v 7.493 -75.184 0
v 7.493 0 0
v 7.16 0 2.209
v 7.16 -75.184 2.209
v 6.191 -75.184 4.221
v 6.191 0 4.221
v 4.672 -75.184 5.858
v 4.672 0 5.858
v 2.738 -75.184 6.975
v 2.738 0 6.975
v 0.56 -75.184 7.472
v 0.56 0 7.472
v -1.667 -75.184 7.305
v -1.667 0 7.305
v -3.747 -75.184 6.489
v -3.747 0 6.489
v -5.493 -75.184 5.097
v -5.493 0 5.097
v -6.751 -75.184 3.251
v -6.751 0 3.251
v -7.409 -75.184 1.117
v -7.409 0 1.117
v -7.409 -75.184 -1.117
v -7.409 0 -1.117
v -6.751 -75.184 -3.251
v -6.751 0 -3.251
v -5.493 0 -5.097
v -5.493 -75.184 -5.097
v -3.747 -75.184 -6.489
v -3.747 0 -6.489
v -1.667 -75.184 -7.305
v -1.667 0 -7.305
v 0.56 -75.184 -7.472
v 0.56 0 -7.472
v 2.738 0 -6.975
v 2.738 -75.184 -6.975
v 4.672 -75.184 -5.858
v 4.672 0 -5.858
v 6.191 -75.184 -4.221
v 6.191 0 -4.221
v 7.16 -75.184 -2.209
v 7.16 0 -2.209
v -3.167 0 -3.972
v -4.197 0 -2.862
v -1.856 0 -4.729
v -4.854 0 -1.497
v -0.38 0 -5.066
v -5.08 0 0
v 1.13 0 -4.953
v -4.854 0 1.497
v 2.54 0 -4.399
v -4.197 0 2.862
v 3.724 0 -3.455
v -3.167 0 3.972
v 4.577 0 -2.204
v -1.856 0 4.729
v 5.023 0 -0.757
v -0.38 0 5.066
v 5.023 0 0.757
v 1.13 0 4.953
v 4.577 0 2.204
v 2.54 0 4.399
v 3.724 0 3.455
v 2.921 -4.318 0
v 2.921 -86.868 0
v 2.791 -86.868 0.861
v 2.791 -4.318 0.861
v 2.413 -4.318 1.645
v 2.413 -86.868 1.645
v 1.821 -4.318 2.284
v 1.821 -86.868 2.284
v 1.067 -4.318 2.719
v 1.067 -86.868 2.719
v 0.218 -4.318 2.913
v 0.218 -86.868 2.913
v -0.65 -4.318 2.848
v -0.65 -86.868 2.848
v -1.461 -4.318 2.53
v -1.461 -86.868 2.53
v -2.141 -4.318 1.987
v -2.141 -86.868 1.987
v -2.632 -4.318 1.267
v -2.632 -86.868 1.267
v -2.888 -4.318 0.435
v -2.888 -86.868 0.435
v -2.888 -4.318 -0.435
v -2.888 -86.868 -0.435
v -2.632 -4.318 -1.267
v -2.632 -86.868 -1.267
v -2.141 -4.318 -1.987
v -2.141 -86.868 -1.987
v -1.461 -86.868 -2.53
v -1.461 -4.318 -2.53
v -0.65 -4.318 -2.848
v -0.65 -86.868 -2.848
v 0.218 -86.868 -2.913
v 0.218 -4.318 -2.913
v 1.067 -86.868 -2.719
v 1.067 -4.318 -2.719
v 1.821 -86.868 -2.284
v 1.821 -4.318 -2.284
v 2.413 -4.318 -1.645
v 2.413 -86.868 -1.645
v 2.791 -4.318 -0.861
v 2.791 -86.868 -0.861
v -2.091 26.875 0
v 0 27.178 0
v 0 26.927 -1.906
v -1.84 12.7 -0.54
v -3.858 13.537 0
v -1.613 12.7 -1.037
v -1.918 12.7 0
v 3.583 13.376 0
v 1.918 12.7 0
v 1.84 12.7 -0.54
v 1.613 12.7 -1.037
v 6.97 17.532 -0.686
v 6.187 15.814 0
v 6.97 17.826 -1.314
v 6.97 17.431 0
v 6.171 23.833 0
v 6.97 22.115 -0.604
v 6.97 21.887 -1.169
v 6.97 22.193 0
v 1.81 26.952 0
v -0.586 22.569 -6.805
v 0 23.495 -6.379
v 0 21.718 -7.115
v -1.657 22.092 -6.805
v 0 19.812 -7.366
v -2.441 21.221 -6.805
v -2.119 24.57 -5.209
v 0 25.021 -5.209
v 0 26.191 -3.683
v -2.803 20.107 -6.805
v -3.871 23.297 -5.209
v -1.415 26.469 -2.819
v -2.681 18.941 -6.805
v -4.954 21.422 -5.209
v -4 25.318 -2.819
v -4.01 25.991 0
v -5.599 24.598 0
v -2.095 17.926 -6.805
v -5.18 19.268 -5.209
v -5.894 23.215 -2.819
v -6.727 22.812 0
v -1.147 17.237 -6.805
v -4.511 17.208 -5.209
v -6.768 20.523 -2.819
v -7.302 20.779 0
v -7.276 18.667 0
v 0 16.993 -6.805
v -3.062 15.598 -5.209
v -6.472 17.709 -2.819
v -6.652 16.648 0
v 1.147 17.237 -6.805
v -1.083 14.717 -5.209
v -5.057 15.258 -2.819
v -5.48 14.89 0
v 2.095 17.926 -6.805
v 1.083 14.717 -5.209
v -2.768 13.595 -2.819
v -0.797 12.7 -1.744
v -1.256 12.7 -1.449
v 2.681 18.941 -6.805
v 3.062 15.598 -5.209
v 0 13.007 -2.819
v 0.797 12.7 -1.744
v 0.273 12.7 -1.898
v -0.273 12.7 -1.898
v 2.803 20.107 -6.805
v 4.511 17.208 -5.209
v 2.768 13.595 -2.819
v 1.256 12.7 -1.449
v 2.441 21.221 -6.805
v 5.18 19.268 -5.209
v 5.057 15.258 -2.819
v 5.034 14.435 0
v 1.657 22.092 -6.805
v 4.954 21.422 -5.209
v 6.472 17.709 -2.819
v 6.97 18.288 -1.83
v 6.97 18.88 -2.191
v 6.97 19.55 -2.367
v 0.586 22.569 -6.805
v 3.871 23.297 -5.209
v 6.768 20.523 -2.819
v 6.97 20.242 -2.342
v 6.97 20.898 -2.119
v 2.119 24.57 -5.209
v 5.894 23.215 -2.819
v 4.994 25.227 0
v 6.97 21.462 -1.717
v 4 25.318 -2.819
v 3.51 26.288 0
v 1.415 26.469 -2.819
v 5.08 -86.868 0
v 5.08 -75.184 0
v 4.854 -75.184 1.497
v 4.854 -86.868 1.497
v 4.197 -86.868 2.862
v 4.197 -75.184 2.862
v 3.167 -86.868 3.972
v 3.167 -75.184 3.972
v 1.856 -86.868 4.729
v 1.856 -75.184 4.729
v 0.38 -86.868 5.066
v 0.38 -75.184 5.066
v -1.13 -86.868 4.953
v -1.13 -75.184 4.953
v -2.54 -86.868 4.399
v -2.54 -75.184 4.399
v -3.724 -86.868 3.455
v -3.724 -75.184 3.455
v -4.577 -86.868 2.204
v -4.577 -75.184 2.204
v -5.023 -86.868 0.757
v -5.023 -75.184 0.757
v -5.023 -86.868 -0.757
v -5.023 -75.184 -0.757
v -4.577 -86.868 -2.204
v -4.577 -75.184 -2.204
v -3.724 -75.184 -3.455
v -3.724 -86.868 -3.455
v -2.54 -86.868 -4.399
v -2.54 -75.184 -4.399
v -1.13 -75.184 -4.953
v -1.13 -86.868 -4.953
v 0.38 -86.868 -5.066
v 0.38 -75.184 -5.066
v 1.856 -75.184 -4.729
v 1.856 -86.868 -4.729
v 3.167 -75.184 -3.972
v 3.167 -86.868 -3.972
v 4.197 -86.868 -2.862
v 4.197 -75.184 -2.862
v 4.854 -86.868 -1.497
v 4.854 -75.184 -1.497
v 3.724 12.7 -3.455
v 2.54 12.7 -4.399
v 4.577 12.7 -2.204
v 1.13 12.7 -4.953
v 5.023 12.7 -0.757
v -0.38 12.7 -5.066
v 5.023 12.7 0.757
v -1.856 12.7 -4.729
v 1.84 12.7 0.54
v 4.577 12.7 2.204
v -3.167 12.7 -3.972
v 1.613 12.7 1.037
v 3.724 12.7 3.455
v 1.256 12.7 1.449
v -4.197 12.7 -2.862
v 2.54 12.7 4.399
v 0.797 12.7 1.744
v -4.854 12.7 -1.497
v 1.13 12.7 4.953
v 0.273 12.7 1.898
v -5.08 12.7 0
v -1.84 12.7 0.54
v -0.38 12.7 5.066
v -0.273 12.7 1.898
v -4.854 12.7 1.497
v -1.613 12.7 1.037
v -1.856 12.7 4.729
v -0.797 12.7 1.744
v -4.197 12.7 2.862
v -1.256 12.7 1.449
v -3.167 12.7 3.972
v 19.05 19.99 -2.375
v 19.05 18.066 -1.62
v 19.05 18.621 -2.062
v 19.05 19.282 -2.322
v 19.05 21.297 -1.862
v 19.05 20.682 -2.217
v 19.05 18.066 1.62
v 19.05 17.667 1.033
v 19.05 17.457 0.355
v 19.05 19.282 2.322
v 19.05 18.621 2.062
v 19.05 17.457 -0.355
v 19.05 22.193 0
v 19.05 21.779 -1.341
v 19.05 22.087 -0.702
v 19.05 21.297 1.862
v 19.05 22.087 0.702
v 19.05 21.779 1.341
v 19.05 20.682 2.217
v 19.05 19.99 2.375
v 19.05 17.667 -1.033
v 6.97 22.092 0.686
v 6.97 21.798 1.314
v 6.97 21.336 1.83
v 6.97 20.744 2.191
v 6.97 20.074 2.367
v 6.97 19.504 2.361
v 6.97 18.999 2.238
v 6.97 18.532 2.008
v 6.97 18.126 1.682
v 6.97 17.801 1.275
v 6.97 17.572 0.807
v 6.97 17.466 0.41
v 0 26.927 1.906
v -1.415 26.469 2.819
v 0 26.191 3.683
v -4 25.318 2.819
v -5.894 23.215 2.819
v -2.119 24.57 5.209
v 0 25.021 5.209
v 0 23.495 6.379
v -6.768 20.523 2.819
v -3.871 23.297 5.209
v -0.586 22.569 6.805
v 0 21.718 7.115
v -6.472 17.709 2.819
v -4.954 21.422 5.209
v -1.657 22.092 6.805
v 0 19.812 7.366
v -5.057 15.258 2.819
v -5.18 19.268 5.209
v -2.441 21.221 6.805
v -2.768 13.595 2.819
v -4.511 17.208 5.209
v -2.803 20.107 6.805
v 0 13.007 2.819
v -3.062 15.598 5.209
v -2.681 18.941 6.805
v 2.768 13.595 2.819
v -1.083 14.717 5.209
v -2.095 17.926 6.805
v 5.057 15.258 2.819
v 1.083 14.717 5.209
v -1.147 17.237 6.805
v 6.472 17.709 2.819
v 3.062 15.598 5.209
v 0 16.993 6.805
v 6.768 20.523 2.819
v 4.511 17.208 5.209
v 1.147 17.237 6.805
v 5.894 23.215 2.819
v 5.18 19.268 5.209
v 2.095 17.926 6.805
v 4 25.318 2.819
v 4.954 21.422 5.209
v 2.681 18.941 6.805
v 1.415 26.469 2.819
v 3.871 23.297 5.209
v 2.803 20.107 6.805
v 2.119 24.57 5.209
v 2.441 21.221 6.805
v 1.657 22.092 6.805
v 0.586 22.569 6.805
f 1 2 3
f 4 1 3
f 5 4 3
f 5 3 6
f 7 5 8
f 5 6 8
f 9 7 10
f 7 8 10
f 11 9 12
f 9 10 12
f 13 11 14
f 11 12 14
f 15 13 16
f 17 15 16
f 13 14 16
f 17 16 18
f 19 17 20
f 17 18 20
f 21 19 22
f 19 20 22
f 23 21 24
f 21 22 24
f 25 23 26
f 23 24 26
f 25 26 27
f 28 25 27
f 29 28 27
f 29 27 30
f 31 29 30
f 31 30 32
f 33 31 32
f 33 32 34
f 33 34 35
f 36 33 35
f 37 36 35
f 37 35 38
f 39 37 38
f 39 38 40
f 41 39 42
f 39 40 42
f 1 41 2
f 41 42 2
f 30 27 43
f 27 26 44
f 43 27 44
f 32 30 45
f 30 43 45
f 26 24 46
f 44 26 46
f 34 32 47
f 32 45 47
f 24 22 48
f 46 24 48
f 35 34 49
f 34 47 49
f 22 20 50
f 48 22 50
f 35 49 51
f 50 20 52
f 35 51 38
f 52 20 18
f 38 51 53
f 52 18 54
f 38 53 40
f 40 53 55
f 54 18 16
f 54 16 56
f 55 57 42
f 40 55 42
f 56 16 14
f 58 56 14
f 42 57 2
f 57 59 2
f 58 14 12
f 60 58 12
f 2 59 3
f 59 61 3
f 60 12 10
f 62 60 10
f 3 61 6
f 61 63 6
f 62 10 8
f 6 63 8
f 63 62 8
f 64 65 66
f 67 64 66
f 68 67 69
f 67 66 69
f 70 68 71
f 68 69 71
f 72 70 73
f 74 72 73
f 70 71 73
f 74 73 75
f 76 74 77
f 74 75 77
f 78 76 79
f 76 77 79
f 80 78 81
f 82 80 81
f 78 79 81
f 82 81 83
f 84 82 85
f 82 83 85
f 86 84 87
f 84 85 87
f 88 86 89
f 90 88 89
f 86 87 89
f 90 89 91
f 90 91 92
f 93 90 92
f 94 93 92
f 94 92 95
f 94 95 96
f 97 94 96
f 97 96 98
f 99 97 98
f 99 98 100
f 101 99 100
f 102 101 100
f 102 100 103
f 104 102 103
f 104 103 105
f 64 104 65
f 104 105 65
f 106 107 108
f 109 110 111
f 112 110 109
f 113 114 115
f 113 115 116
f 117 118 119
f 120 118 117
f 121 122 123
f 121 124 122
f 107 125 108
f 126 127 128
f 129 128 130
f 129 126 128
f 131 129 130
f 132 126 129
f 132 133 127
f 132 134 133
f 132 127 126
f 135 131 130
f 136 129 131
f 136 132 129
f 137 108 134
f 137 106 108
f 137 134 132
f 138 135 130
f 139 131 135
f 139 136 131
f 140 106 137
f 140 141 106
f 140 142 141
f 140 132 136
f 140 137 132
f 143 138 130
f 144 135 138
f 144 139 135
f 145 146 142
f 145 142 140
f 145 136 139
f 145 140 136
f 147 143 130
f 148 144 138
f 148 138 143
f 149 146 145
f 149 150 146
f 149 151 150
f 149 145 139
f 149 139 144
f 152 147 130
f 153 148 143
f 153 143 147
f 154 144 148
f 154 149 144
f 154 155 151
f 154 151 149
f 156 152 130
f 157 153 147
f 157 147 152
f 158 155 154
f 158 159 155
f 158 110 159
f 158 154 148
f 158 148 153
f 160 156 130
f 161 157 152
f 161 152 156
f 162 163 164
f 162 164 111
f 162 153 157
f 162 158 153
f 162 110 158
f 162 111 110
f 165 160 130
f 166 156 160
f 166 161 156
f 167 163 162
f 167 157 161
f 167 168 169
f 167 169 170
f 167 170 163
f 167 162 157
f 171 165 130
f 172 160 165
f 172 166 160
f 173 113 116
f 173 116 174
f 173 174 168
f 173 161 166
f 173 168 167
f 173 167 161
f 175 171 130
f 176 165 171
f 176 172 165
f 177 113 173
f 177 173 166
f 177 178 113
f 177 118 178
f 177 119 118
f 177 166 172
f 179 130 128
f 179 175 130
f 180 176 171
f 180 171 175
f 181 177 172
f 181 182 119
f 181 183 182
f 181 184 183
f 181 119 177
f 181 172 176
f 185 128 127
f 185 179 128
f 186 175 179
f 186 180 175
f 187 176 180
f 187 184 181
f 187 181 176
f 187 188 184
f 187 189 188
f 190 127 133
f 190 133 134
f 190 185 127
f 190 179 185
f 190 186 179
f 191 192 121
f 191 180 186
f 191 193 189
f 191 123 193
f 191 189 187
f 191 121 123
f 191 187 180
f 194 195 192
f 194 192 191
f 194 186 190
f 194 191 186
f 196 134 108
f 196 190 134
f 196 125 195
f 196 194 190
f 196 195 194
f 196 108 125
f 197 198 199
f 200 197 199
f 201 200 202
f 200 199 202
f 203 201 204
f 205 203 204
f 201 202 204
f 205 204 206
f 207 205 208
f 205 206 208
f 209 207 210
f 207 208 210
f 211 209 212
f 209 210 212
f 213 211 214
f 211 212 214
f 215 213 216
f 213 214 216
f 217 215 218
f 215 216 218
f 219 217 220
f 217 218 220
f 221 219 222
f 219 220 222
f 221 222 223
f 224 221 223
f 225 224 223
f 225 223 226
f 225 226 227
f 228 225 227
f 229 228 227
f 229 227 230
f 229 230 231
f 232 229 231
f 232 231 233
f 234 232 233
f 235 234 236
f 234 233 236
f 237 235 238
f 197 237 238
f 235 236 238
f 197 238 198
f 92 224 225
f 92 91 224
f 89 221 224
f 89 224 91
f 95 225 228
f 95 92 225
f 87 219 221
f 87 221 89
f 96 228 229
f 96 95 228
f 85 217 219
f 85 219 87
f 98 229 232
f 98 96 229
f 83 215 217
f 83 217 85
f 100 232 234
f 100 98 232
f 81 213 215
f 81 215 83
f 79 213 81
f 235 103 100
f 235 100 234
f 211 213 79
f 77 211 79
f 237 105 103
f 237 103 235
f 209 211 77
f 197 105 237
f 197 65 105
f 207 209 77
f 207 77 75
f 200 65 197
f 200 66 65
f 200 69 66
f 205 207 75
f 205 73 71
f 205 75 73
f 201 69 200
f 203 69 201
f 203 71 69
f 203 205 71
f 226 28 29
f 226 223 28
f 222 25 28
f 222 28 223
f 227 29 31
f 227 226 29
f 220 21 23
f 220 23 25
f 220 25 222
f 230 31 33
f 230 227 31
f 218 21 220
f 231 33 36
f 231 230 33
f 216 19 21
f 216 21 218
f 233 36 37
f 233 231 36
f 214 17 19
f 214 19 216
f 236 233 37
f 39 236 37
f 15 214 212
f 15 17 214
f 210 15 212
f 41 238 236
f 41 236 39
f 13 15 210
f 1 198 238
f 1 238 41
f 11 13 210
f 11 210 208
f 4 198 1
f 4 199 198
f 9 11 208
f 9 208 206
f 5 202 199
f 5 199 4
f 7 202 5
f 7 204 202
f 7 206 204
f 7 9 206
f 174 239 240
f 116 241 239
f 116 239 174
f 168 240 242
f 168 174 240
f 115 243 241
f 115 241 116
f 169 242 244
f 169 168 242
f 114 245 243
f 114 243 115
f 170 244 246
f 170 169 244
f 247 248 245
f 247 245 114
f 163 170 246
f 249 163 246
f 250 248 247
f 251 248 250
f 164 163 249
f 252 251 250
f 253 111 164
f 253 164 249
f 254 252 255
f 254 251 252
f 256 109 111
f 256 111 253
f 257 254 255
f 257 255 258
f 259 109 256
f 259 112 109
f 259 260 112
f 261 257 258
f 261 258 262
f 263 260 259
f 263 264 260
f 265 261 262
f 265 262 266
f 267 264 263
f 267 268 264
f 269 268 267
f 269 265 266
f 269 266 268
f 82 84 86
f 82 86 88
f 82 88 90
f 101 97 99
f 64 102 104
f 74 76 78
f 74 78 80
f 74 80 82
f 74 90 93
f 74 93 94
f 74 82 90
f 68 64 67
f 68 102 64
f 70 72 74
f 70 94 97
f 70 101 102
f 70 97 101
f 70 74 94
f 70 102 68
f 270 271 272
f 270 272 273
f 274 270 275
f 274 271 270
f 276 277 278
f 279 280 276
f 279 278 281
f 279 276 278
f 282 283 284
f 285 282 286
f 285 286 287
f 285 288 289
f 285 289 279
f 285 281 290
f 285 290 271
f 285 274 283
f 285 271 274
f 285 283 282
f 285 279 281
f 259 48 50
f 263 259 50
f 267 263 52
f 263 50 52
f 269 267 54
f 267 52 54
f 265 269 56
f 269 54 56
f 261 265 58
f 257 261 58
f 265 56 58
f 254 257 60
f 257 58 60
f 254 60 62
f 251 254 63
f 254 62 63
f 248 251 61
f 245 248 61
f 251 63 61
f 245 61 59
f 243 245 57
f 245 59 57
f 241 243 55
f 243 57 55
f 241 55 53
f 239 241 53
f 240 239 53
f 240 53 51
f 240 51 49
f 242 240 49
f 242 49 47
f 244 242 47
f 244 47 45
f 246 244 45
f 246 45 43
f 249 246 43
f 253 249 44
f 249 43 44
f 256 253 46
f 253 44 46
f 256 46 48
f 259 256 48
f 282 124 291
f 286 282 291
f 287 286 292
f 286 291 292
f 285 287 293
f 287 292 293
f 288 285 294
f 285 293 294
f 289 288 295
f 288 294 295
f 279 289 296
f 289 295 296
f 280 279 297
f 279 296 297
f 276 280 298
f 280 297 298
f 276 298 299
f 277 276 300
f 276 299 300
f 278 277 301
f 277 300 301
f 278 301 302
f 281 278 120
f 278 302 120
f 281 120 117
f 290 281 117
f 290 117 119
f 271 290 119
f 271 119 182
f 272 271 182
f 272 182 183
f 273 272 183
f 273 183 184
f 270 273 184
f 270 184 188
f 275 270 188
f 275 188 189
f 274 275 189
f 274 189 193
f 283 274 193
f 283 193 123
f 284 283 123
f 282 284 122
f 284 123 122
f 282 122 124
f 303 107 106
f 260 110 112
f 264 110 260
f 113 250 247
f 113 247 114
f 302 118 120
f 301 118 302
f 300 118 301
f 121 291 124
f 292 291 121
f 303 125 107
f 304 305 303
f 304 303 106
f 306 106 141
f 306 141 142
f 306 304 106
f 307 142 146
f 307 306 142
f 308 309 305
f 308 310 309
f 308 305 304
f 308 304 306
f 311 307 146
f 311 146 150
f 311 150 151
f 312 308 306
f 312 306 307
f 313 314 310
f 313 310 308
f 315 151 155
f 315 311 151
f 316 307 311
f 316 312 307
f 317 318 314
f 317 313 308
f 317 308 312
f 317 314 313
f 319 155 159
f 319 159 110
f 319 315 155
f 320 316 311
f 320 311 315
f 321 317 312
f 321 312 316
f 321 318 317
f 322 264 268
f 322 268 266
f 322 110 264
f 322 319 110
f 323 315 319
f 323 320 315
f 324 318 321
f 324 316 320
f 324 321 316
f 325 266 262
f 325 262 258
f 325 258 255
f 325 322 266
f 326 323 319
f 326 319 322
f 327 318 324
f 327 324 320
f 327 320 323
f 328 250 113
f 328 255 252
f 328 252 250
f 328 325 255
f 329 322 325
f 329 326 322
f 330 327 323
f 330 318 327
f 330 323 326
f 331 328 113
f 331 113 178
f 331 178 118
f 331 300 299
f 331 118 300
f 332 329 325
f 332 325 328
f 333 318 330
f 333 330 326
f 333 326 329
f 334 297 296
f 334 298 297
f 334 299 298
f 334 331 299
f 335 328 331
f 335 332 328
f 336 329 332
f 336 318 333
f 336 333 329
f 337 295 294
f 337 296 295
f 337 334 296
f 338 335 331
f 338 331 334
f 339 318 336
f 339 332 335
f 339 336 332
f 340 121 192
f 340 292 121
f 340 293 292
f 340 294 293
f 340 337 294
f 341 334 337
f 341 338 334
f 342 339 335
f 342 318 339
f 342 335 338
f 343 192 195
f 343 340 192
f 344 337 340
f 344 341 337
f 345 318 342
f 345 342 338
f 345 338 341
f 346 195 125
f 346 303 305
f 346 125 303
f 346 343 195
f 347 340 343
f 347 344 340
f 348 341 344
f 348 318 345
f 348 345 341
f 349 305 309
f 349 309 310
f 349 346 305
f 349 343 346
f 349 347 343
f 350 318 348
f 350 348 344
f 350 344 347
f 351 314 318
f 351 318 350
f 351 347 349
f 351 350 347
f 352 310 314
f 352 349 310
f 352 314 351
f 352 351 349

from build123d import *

# Parameters (mm, degrees)
F0_R      = 7.493
F1_DEPTH  = 75.184
F2_R      = 5.08
F3_DEPTH  = 12.7
F4_R      = 5.08
F5_DEPTH  = 11.684
F8_R      = 2.921
F9_DEPTH  = 82.55
F10_R     = 2.38125
F11_DEPTH = 19.05


with BuildPart() as f1:
    # F0 (on Front) → F1 (new body)
    with BuildSketch(Plane.XZ):
        Circle(F0_R)
    extrude(amount=F1_DEPTH)

    # F2 (on face) → F3 (join)
    with BuildSketch(Plane(origin=(0, 0, 0), x_dir=(-1, 0, 0), z_dir=(0, 1, 0))):
        Circle(F2_R)
    extrude(amount=F3_DEPTH)

    # F4 (on face) → F5 (join)
    with BuildSketch(Plane.XZ.offset(75.184)):
        Circle(F4_R)
    extrude(amount=F5_DEPTH)

    # F6 (on Right) → F7 (revolve)
    with BuildSketch(Plane.YZ):
        with BuildLine():
            ThreePointArc((19.812, -7.366), (25.0205485502, -5.2085485502), (27.178, 0))
            ThreePointArc((27.178, 0), (25.0205485502, 5.2085485502), (19.812, 7.366))
            Line((19.812, 7.366), (19.812, 0))
            Line((19.812, 0), (19.812, -7.366))
        make_face()
    revolve(axis=Axis((0, 19.812, 3.683), (0, 0, 1)))

    # F8 (on face) → F9 (cut)
    with BuildSketch(Plane.XZ.offset(86.868)):
        Circle(F8_R)
    extrude(amount=-F9_DEPTH, mode=Mode.SUBTRACT)

    # F10 (on Right) → F11 (join)
    with BuildSketch(Plane.YZ):
        with Locations((19.812, 0)):
            Circle(F10_R)
    extrude(amount=F11_DEPTH)


solid = f1.part
